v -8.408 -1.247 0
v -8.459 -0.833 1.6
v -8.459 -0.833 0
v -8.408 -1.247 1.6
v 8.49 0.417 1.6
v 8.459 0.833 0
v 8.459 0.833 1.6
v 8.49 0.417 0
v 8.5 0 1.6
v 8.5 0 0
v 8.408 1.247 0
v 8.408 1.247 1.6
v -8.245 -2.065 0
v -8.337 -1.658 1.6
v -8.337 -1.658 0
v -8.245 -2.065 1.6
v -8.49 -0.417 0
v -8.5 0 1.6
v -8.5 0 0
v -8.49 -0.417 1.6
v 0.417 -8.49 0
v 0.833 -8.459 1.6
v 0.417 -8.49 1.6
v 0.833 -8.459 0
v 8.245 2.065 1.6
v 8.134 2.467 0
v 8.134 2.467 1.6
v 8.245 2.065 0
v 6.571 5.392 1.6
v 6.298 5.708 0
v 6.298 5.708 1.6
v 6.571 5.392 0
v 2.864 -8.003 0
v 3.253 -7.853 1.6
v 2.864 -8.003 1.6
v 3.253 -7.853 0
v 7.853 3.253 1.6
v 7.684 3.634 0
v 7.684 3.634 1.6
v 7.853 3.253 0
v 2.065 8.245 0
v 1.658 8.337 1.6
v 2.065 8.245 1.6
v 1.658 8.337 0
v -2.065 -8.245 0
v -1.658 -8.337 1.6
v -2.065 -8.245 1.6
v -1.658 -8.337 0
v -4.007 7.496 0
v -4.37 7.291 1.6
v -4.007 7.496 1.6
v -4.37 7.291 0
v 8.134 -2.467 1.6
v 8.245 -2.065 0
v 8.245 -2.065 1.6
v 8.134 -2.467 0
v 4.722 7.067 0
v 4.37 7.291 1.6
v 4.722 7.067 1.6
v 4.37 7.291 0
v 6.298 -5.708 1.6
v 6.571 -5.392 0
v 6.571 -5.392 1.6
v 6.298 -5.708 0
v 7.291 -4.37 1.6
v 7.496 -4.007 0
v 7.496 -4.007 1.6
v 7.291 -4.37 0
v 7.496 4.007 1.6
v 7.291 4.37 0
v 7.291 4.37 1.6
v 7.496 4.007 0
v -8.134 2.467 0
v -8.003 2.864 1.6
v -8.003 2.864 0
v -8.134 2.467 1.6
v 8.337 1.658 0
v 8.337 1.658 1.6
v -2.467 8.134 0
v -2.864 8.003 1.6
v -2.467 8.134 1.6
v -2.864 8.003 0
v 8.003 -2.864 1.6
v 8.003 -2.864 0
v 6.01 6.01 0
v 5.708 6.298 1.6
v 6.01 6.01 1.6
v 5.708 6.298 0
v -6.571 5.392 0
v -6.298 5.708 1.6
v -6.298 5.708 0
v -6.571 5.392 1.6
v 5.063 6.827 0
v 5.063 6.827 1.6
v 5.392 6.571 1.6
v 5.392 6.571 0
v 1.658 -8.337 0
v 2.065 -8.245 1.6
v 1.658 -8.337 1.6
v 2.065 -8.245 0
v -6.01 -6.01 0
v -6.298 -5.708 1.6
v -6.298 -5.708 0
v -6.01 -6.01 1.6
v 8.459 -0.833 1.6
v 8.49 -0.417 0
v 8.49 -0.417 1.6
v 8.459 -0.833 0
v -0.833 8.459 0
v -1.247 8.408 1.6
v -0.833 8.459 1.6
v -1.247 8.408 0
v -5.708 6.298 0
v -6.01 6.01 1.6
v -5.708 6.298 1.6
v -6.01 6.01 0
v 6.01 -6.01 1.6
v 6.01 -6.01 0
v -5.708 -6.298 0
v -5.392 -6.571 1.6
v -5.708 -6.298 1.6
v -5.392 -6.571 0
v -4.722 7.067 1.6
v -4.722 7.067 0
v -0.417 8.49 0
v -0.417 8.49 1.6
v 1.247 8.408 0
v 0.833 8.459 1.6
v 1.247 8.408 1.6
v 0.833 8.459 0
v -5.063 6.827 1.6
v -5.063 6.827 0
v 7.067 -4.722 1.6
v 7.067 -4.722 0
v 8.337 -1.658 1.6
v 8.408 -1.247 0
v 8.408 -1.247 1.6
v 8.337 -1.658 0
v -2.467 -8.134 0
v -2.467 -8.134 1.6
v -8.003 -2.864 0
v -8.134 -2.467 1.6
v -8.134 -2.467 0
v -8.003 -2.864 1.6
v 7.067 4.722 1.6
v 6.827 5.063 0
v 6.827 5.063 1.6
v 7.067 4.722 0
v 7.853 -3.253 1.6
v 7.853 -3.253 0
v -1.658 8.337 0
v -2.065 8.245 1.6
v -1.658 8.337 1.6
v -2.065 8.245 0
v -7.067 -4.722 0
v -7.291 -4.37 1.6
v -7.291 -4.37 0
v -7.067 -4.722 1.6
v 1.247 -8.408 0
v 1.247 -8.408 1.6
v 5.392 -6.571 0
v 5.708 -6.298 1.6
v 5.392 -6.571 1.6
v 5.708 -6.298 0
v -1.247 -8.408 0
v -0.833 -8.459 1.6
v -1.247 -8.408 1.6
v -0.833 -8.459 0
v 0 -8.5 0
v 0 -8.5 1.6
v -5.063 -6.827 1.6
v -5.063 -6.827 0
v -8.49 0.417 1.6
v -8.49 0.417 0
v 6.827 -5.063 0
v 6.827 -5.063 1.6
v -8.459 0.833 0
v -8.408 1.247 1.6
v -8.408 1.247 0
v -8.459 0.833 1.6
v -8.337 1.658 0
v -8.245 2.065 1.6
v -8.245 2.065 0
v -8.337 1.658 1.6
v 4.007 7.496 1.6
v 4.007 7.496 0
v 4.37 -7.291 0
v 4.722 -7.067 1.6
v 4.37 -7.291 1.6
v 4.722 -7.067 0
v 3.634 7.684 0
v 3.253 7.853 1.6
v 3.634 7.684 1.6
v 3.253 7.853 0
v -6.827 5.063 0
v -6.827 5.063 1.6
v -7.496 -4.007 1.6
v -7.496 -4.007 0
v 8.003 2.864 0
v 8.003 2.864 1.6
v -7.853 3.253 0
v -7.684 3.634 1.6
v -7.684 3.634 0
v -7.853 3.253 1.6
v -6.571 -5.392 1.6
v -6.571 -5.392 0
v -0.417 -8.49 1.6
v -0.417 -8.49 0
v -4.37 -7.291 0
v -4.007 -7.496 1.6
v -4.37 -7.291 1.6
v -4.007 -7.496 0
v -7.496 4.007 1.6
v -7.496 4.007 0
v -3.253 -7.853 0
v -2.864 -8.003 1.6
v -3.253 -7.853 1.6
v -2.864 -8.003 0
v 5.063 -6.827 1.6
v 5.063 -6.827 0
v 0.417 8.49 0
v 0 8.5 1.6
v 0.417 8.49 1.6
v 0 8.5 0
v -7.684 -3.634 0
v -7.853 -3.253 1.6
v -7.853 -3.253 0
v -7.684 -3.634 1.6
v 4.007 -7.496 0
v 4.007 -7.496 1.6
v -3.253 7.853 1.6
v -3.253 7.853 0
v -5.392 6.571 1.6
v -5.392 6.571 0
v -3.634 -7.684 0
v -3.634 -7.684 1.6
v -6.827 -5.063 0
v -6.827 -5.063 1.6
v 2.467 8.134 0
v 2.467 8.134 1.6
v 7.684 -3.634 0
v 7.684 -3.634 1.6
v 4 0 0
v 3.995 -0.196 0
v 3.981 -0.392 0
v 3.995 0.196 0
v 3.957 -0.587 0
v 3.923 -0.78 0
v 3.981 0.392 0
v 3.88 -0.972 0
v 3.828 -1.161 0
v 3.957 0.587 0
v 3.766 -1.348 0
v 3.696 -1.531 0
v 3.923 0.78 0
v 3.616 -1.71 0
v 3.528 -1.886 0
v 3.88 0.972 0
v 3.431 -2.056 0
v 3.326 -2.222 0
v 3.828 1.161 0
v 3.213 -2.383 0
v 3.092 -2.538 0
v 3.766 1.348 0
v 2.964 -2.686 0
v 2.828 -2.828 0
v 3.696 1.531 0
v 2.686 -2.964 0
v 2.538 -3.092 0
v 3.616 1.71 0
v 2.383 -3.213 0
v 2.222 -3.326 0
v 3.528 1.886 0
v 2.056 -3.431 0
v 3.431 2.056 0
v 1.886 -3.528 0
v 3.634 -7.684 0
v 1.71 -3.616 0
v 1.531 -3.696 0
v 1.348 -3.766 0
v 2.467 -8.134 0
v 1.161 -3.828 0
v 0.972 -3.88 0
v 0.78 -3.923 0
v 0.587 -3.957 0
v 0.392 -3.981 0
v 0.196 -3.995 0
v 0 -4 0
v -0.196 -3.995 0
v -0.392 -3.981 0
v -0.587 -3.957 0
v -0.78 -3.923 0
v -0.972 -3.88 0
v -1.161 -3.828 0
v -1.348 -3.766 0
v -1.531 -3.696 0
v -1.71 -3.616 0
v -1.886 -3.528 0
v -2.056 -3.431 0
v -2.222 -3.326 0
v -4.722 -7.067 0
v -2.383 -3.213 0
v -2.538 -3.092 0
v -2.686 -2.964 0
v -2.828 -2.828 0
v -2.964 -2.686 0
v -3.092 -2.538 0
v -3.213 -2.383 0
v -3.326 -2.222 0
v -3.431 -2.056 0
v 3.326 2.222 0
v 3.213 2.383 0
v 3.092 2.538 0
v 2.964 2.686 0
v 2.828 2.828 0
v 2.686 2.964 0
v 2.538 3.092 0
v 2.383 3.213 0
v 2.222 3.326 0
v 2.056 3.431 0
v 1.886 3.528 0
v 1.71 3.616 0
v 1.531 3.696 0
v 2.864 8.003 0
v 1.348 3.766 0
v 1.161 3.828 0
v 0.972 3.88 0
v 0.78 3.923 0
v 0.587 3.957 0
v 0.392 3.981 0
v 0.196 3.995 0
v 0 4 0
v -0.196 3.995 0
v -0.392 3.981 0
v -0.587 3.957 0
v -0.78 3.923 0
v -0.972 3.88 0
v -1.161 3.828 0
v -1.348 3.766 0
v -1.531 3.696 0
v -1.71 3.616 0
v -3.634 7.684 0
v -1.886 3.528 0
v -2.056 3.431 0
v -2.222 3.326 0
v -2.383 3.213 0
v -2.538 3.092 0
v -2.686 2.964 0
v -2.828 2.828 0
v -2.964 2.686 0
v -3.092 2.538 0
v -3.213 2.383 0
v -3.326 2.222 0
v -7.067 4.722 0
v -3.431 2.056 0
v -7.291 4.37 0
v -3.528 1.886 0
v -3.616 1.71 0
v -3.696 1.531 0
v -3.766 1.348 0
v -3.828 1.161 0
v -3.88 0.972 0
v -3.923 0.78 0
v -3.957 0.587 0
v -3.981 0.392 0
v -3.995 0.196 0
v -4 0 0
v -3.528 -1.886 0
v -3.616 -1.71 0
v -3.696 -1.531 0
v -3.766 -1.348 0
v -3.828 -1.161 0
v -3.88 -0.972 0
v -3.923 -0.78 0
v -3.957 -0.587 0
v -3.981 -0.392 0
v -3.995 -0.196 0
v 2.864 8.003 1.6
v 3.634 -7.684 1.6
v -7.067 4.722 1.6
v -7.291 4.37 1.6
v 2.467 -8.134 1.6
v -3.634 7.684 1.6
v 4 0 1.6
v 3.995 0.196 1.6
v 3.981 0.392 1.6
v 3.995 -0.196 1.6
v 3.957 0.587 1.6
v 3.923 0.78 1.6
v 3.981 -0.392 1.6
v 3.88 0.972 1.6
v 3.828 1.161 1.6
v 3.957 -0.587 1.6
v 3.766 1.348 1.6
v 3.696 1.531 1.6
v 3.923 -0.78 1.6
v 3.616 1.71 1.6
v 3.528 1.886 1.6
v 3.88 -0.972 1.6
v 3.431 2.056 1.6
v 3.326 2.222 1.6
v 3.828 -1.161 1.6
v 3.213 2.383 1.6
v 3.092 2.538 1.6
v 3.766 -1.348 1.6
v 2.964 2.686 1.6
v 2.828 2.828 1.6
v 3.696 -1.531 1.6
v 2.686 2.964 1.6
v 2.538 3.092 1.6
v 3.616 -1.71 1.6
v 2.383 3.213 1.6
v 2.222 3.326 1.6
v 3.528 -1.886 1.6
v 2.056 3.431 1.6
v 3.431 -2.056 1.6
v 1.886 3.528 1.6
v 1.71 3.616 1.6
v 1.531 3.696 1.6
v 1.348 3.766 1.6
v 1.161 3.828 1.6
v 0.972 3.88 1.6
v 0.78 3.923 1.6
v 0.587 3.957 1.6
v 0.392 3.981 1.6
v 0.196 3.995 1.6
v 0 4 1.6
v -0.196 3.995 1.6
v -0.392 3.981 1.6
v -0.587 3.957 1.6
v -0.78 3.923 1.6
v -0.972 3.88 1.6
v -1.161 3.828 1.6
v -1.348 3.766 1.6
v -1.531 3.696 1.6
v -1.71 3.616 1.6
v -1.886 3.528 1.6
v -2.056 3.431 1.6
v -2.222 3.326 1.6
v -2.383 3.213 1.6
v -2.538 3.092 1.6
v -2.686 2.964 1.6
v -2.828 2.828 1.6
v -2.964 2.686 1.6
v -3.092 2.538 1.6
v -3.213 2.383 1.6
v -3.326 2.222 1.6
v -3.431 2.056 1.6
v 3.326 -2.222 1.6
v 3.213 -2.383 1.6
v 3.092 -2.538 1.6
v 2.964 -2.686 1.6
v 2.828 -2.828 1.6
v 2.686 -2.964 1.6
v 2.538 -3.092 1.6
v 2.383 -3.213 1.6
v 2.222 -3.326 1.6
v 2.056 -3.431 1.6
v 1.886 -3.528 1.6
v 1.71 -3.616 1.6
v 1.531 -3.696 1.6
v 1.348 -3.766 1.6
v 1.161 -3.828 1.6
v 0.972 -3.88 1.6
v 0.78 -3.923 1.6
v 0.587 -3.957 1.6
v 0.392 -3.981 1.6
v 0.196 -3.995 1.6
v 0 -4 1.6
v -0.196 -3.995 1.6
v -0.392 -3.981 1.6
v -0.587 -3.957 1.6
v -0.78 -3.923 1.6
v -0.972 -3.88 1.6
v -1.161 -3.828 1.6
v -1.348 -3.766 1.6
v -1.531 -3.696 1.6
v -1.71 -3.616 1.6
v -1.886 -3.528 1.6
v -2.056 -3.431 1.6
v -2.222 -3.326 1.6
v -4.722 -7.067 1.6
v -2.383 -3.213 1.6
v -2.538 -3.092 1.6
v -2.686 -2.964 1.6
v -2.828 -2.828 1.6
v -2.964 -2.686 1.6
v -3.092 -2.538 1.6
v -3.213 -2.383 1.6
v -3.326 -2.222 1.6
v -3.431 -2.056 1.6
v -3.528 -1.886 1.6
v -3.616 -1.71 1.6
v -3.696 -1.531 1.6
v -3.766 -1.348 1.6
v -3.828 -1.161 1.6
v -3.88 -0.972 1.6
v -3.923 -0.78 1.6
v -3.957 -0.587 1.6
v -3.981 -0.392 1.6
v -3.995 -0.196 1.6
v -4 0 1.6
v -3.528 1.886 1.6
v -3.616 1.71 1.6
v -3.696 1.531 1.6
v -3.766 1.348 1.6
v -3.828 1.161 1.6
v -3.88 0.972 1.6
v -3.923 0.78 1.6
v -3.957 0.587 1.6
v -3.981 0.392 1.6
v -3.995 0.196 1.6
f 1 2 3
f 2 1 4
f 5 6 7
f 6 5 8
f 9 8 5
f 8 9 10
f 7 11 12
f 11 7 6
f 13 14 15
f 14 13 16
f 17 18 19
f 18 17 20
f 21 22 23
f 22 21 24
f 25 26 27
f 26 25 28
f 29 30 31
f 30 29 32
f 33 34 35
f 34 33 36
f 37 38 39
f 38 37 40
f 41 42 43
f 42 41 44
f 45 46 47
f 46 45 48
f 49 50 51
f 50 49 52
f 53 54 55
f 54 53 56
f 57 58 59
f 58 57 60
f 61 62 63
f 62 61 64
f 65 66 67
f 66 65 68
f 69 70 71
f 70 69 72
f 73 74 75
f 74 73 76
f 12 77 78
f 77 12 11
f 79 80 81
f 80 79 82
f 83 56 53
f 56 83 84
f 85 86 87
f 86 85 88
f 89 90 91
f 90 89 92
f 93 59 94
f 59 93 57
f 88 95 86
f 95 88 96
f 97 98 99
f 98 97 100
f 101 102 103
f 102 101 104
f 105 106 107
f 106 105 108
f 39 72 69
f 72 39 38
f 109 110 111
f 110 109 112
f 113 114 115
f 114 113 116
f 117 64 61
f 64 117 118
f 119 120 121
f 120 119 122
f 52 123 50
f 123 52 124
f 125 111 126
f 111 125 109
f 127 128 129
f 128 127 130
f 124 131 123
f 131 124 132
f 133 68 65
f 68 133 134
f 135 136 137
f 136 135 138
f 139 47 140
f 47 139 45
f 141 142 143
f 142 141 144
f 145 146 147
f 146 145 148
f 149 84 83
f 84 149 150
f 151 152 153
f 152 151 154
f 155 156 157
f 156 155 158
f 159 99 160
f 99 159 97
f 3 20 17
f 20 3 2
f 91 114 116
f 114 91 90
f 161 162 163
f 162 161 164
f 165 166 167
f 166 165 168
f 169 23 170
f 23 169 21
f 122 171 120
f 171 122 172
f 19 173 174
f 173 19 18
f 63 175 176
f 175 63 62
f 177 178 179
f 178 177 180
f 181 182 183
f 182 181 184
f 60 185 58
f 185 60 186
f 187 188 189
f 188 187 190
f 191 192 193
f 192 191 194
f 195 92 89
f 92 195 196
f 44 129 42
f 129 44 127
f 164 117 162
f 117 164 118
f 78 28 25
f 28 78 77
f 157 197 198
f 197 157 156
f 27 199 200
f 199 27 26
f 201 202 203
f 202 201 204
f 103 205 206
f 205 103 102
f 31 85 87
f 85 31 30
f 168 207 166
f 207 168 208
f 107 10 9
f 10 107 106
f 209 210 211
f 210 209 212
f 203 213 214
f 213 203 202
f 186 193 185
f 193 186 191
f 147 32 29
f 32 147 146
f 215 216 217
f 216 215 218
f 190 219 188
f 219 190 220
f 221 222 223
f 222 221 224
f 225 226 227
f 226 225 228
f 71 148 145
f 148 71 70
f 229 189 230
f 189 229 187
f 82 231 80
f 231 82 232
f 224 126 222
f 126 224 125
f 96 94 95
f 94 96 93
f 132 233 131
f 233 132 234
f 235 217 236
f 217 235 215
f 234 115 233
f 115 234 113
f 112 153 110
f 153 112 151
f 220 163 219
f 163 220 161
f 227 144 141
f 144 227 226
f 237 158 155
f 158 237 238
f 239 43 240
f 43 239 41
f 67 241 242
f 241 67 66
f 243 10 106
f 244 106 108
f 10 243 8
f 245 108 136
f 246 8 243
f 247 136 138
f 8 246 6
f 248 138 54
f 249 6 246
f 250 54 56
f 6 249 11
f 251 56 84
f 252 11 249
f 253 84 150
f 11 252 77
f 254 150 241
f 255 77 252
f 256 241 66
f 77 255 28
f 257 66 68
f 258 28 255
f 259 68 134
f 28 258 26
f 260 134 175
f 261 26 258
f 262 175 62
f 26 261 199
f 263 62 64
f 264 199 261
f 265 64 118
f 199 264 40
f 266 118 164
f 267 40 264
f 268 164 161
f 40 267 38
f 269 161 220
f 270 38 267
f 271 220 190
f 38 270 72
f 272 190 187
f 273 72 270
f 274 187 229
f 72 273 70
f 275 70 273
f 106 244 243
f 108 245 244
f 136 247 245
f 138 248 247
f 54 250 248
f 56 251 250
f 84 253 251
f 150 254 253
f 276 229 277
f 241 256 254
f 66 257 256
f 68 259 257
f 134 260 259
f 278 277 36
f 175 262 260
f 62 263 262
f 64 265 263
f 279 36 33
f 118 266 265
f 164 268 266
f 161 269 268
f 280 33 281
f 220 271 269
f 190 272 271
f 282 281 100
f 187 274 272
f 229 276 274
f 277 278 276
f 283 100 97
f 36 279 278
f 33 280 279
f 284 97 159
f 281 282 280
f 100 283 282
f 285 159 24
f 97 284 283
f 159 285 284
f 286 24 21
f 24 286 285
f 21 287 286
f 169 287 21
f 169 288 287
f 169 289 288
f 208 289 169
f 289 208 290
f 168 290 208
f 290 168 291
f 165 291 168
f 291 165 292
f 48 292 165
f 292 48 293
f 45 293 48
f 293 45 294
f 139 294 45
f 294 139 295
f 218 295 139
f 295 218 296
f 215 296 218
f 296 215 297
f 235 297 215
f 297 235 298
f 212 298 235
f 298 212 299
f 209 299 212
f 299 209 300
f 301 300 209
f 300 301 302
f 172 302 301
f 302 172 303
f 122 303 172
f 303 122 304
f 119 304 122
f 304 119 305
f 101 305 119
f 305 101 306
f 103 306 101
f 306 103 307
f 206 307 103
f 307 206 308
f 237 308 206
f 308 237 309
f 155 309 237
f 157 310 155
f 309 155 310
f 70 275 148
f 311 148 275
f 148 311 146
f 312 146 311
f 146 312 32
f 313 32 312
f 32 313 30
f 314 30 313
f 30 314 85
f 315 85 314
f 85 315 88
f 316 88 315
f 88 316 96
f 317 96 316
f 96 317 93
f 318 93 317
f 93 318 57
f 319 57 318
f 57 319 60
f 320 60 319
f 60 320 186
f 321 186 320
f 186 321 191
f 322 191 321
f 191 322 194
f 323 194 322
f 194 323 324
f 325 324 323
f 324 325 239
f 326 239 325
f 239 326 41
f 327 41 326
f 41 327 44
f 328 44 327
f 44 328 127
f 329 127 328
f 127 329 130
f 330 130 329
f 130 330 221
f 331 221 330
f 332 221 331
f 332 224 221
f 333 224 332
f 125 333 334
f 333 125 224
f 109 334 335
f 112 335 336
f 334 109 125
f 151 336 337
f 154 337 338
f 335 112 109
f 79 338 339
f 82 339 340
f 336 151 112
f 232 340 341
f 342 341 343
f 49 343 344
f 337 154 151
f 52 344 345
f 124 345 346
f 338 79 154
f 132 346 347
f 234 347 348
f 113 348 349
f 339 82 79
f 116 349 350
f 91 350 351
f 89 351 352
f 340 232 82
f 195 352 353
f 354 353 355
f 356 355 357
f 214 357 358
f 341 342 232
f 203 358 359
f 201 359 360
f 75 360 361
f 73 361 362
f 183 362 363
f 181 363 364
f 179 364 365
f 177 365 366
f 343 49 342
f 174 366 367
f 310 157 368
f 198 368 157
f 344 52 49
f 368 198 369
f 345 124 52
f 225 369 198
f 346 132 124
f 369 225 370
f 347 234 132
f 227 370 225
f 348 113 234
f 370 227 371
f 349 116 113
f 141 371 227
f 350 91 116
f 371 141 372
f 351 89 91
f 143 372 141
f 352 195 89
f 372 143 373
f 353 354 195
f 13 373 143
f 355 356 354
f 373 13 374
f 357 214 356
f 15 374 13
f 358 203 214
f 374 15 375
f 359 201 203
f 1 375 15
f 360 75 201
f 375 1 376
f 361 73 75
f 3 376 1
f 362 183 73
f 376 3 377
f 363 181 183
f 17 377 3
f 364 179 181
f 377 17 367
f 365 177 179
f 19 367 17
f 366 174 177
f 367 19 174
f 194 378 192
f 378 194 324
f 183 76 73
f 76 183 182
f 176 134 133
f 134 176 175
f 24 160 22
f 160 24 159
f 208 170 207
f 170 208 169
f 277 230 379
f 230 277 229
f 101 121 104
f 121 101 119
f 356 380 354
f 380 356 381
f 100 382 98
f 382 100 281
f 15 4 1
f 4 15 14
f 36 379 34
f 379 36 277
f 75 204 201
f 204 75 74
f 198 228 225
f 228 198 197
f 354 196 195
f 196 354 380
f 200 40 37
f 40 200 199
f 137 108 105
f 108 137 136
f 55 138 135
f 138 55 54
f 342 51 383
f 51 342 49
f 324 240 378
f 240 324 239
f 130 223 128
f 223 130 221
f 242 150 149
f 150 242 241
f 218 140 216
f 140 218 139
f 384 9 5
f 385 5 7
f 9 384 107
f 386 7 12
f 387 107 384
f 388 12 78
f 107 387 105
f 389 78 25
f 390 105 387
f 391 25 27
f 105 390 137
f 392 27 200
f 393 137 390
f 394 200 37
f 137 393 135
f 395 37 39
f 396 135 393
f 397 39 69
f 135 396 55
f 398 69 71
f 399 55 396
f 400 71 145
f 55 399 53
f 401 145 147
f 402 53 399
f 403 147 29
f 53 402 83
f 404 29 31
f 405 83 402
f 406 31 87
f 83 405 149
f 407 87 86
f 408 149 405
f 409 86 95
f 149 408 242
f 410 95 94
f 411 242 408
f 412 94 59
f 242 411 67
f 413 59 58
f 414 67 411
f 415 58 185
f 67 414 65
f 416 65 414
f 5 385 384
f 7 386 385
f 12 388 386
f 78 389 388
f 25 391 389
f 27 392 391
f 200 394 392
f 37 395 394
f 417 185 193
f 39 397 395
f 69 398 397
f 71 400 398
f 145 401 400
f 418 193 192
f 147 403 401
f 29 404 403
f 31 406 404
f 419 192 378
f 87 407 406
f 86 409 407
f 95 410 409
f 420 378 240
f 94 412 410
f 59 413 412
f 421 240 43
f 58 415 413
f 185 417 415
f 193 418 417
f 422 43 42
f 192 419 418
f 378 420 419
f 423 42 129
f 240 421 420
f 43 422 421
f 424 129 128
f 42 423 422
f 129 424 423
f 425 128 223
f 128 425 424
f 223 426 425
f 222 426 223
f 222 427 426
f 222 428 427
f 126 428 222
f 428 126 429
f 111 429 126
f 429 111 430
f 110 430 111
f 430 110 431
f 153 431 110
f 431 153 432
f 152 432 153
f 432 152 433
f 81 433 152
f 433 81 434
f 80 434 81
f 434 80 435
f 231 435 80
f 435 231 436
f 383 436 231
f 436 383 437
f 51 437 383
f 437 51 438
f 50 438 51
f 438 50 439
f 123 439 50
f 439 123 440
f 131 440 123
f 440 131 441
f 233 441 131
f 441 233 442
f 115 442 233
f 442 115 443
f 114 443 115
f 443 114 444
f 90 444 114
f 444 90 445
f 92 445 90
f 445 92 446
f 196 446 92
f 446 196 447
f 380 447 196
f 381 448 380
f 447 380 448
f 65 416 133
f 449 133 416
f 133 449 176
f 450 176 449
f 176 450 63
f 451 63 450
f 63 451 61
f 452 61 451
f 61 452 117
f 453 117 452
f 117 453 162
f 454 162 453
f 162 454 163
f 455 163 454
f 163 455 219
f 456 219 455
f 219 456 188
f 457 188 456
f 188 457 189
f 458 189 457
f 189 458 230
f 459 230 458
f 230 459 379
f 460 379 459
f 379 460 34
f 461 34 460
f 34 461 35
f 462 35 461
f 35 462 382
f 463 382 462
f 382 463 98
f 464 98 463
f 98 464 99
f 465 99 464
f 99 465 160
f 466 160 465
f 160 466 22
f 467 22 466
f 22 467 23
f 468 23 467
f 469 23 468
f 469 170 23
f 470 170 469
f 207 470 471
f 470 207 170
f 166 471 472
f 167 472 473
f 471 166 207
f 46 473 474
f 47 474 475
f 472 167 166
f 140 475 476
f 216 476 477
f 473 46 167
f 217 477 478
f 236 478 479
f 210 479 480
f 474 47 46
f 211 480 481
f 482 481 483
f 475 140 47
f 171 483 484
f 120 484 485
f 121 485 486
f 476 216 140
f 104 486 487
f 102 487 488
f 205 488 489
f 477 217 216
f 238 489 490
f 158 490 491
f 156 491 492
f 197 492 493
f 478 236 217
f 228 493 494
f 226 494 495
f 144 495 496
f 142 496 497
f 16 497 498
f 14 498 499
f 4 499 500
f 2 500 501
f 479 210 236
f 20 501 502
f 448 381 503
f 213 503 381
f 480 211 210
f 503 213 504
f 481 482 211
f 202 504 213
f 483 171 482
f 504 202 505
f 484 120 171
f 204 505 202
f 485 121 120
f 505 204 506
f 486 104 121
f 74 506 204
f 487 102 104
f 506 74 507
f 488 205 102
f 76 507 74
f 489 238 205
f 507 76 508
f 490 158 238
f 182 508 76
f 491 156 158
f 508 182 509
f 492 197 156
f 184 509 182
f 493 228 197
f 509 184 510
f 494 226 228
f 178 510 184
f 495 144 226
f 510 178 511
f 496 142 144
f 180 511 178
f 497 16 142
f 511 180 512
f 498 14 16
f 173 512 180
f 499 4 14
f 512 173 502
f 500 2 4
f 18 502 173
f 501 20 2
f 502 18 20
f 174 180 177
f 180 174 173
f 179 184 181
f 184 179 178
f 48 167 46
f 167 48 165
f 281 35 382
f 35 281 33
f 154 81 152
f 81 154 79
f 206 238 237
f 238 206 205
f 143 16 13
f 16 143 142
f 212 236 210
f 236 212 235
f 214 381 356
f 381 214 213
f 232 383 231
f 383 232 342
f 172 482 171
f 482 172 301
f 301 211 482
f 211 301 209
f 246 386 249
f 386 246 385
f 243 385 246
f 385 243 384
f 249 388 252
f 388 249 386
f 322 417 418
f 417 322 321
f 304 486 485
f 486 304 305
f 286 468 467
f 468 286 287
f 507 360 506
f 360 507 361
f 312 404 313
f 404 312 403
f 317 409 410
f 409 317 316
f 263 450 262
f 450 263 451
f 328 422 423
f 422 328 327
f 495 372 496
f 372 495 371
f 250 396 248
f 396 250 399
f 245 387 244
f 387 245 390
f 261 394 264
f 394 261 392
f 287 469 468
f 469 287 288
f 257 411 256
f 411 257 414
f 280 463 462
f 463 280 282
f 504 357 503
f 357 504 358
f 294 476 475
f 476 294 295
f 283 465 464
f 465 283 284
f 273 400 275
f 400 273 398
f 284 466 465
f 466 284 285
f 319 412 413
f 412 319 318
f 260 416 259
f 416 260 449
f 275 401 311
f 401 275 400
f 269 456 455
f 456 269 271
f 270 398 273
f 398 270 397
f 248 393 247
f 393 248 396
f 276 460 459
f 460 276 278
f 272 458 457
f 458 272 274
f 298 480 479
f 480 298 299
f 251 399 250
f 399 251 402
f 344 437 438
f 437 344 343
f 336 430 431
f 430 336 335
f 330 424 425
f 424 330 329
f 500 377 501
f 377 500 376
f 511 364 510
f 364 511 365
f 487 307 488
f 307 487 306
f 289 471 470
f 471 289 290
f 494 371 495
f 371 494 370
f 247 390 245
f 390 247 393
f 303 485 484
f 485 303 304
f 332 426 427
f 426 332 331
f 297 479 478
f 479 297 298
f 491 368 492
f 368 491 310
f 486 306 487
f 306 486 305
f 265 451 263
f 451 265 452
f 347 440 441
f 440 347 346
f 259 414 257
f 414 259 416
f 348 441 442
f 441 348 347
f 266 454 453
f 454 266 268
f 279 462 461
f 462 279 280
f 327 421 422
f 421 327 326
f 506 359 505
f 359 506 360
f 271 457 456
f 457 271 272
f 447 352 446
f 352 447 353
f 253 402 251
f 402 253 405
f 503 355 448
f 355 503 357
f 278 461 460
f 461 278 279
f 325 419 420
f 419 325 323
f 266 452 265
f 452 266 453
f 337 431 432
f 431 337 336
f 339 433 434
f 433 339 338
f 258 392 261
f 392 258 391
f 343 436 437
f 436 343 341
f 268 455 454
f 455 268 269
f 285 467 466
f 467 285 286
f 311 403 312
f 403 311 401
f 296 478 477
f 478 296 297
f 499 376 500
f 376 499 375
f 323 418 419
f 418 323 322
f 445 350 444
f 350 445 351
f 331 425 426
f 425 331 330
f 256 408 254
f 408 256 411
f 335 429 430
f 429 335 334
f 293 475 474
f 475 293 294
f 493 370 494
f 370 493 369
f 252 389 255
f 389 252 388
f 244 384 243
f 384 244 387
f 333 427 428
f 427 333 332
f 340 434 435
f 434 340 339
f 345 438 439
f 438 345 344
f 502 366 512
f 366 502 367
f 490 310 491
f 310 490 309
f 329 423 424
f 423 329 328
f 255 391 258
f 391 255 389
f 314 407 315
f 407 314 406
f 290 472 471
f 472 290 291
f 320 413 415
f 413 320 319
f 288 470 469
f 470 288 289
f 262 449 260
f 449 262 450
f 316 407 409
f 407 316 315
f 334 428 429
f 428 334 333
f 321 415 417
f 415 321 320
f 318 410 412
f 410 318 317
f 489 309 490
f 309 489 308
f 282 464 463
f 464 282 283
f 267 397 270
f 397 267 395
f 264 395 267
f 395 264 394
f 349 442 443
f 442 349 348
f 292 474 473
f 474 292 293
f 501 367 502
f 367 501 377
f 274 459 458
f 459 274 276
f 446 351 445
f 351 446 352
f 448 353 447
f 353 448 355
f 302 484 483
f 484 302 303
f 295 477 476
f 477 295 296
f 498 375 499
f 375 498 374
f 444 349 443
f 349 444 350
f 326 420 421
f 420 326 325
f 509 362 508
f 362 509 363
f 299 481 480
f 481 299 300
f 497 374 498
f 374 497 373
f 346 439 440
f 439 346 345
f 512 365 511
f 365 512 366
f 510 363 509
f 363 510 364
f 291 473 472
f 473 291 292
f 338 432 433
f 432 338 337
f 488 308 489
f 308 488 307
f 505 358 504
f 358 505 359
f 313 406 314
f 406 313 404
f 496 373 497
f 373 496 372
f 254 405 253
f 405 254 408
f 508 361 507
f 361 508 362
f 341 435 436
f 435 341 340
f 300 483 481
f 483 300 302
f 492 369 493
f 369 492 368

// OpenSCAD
$fn = 128;

inner_d = 8.0;
outer_d = 17.0;
thickness = 1.6;

difference() {
  cylinder(d = outer_d, h = thickness);
  translate([0, 0, -0.1])
    cylinder(d = inner_d, h = thickness + 0.2);
}
